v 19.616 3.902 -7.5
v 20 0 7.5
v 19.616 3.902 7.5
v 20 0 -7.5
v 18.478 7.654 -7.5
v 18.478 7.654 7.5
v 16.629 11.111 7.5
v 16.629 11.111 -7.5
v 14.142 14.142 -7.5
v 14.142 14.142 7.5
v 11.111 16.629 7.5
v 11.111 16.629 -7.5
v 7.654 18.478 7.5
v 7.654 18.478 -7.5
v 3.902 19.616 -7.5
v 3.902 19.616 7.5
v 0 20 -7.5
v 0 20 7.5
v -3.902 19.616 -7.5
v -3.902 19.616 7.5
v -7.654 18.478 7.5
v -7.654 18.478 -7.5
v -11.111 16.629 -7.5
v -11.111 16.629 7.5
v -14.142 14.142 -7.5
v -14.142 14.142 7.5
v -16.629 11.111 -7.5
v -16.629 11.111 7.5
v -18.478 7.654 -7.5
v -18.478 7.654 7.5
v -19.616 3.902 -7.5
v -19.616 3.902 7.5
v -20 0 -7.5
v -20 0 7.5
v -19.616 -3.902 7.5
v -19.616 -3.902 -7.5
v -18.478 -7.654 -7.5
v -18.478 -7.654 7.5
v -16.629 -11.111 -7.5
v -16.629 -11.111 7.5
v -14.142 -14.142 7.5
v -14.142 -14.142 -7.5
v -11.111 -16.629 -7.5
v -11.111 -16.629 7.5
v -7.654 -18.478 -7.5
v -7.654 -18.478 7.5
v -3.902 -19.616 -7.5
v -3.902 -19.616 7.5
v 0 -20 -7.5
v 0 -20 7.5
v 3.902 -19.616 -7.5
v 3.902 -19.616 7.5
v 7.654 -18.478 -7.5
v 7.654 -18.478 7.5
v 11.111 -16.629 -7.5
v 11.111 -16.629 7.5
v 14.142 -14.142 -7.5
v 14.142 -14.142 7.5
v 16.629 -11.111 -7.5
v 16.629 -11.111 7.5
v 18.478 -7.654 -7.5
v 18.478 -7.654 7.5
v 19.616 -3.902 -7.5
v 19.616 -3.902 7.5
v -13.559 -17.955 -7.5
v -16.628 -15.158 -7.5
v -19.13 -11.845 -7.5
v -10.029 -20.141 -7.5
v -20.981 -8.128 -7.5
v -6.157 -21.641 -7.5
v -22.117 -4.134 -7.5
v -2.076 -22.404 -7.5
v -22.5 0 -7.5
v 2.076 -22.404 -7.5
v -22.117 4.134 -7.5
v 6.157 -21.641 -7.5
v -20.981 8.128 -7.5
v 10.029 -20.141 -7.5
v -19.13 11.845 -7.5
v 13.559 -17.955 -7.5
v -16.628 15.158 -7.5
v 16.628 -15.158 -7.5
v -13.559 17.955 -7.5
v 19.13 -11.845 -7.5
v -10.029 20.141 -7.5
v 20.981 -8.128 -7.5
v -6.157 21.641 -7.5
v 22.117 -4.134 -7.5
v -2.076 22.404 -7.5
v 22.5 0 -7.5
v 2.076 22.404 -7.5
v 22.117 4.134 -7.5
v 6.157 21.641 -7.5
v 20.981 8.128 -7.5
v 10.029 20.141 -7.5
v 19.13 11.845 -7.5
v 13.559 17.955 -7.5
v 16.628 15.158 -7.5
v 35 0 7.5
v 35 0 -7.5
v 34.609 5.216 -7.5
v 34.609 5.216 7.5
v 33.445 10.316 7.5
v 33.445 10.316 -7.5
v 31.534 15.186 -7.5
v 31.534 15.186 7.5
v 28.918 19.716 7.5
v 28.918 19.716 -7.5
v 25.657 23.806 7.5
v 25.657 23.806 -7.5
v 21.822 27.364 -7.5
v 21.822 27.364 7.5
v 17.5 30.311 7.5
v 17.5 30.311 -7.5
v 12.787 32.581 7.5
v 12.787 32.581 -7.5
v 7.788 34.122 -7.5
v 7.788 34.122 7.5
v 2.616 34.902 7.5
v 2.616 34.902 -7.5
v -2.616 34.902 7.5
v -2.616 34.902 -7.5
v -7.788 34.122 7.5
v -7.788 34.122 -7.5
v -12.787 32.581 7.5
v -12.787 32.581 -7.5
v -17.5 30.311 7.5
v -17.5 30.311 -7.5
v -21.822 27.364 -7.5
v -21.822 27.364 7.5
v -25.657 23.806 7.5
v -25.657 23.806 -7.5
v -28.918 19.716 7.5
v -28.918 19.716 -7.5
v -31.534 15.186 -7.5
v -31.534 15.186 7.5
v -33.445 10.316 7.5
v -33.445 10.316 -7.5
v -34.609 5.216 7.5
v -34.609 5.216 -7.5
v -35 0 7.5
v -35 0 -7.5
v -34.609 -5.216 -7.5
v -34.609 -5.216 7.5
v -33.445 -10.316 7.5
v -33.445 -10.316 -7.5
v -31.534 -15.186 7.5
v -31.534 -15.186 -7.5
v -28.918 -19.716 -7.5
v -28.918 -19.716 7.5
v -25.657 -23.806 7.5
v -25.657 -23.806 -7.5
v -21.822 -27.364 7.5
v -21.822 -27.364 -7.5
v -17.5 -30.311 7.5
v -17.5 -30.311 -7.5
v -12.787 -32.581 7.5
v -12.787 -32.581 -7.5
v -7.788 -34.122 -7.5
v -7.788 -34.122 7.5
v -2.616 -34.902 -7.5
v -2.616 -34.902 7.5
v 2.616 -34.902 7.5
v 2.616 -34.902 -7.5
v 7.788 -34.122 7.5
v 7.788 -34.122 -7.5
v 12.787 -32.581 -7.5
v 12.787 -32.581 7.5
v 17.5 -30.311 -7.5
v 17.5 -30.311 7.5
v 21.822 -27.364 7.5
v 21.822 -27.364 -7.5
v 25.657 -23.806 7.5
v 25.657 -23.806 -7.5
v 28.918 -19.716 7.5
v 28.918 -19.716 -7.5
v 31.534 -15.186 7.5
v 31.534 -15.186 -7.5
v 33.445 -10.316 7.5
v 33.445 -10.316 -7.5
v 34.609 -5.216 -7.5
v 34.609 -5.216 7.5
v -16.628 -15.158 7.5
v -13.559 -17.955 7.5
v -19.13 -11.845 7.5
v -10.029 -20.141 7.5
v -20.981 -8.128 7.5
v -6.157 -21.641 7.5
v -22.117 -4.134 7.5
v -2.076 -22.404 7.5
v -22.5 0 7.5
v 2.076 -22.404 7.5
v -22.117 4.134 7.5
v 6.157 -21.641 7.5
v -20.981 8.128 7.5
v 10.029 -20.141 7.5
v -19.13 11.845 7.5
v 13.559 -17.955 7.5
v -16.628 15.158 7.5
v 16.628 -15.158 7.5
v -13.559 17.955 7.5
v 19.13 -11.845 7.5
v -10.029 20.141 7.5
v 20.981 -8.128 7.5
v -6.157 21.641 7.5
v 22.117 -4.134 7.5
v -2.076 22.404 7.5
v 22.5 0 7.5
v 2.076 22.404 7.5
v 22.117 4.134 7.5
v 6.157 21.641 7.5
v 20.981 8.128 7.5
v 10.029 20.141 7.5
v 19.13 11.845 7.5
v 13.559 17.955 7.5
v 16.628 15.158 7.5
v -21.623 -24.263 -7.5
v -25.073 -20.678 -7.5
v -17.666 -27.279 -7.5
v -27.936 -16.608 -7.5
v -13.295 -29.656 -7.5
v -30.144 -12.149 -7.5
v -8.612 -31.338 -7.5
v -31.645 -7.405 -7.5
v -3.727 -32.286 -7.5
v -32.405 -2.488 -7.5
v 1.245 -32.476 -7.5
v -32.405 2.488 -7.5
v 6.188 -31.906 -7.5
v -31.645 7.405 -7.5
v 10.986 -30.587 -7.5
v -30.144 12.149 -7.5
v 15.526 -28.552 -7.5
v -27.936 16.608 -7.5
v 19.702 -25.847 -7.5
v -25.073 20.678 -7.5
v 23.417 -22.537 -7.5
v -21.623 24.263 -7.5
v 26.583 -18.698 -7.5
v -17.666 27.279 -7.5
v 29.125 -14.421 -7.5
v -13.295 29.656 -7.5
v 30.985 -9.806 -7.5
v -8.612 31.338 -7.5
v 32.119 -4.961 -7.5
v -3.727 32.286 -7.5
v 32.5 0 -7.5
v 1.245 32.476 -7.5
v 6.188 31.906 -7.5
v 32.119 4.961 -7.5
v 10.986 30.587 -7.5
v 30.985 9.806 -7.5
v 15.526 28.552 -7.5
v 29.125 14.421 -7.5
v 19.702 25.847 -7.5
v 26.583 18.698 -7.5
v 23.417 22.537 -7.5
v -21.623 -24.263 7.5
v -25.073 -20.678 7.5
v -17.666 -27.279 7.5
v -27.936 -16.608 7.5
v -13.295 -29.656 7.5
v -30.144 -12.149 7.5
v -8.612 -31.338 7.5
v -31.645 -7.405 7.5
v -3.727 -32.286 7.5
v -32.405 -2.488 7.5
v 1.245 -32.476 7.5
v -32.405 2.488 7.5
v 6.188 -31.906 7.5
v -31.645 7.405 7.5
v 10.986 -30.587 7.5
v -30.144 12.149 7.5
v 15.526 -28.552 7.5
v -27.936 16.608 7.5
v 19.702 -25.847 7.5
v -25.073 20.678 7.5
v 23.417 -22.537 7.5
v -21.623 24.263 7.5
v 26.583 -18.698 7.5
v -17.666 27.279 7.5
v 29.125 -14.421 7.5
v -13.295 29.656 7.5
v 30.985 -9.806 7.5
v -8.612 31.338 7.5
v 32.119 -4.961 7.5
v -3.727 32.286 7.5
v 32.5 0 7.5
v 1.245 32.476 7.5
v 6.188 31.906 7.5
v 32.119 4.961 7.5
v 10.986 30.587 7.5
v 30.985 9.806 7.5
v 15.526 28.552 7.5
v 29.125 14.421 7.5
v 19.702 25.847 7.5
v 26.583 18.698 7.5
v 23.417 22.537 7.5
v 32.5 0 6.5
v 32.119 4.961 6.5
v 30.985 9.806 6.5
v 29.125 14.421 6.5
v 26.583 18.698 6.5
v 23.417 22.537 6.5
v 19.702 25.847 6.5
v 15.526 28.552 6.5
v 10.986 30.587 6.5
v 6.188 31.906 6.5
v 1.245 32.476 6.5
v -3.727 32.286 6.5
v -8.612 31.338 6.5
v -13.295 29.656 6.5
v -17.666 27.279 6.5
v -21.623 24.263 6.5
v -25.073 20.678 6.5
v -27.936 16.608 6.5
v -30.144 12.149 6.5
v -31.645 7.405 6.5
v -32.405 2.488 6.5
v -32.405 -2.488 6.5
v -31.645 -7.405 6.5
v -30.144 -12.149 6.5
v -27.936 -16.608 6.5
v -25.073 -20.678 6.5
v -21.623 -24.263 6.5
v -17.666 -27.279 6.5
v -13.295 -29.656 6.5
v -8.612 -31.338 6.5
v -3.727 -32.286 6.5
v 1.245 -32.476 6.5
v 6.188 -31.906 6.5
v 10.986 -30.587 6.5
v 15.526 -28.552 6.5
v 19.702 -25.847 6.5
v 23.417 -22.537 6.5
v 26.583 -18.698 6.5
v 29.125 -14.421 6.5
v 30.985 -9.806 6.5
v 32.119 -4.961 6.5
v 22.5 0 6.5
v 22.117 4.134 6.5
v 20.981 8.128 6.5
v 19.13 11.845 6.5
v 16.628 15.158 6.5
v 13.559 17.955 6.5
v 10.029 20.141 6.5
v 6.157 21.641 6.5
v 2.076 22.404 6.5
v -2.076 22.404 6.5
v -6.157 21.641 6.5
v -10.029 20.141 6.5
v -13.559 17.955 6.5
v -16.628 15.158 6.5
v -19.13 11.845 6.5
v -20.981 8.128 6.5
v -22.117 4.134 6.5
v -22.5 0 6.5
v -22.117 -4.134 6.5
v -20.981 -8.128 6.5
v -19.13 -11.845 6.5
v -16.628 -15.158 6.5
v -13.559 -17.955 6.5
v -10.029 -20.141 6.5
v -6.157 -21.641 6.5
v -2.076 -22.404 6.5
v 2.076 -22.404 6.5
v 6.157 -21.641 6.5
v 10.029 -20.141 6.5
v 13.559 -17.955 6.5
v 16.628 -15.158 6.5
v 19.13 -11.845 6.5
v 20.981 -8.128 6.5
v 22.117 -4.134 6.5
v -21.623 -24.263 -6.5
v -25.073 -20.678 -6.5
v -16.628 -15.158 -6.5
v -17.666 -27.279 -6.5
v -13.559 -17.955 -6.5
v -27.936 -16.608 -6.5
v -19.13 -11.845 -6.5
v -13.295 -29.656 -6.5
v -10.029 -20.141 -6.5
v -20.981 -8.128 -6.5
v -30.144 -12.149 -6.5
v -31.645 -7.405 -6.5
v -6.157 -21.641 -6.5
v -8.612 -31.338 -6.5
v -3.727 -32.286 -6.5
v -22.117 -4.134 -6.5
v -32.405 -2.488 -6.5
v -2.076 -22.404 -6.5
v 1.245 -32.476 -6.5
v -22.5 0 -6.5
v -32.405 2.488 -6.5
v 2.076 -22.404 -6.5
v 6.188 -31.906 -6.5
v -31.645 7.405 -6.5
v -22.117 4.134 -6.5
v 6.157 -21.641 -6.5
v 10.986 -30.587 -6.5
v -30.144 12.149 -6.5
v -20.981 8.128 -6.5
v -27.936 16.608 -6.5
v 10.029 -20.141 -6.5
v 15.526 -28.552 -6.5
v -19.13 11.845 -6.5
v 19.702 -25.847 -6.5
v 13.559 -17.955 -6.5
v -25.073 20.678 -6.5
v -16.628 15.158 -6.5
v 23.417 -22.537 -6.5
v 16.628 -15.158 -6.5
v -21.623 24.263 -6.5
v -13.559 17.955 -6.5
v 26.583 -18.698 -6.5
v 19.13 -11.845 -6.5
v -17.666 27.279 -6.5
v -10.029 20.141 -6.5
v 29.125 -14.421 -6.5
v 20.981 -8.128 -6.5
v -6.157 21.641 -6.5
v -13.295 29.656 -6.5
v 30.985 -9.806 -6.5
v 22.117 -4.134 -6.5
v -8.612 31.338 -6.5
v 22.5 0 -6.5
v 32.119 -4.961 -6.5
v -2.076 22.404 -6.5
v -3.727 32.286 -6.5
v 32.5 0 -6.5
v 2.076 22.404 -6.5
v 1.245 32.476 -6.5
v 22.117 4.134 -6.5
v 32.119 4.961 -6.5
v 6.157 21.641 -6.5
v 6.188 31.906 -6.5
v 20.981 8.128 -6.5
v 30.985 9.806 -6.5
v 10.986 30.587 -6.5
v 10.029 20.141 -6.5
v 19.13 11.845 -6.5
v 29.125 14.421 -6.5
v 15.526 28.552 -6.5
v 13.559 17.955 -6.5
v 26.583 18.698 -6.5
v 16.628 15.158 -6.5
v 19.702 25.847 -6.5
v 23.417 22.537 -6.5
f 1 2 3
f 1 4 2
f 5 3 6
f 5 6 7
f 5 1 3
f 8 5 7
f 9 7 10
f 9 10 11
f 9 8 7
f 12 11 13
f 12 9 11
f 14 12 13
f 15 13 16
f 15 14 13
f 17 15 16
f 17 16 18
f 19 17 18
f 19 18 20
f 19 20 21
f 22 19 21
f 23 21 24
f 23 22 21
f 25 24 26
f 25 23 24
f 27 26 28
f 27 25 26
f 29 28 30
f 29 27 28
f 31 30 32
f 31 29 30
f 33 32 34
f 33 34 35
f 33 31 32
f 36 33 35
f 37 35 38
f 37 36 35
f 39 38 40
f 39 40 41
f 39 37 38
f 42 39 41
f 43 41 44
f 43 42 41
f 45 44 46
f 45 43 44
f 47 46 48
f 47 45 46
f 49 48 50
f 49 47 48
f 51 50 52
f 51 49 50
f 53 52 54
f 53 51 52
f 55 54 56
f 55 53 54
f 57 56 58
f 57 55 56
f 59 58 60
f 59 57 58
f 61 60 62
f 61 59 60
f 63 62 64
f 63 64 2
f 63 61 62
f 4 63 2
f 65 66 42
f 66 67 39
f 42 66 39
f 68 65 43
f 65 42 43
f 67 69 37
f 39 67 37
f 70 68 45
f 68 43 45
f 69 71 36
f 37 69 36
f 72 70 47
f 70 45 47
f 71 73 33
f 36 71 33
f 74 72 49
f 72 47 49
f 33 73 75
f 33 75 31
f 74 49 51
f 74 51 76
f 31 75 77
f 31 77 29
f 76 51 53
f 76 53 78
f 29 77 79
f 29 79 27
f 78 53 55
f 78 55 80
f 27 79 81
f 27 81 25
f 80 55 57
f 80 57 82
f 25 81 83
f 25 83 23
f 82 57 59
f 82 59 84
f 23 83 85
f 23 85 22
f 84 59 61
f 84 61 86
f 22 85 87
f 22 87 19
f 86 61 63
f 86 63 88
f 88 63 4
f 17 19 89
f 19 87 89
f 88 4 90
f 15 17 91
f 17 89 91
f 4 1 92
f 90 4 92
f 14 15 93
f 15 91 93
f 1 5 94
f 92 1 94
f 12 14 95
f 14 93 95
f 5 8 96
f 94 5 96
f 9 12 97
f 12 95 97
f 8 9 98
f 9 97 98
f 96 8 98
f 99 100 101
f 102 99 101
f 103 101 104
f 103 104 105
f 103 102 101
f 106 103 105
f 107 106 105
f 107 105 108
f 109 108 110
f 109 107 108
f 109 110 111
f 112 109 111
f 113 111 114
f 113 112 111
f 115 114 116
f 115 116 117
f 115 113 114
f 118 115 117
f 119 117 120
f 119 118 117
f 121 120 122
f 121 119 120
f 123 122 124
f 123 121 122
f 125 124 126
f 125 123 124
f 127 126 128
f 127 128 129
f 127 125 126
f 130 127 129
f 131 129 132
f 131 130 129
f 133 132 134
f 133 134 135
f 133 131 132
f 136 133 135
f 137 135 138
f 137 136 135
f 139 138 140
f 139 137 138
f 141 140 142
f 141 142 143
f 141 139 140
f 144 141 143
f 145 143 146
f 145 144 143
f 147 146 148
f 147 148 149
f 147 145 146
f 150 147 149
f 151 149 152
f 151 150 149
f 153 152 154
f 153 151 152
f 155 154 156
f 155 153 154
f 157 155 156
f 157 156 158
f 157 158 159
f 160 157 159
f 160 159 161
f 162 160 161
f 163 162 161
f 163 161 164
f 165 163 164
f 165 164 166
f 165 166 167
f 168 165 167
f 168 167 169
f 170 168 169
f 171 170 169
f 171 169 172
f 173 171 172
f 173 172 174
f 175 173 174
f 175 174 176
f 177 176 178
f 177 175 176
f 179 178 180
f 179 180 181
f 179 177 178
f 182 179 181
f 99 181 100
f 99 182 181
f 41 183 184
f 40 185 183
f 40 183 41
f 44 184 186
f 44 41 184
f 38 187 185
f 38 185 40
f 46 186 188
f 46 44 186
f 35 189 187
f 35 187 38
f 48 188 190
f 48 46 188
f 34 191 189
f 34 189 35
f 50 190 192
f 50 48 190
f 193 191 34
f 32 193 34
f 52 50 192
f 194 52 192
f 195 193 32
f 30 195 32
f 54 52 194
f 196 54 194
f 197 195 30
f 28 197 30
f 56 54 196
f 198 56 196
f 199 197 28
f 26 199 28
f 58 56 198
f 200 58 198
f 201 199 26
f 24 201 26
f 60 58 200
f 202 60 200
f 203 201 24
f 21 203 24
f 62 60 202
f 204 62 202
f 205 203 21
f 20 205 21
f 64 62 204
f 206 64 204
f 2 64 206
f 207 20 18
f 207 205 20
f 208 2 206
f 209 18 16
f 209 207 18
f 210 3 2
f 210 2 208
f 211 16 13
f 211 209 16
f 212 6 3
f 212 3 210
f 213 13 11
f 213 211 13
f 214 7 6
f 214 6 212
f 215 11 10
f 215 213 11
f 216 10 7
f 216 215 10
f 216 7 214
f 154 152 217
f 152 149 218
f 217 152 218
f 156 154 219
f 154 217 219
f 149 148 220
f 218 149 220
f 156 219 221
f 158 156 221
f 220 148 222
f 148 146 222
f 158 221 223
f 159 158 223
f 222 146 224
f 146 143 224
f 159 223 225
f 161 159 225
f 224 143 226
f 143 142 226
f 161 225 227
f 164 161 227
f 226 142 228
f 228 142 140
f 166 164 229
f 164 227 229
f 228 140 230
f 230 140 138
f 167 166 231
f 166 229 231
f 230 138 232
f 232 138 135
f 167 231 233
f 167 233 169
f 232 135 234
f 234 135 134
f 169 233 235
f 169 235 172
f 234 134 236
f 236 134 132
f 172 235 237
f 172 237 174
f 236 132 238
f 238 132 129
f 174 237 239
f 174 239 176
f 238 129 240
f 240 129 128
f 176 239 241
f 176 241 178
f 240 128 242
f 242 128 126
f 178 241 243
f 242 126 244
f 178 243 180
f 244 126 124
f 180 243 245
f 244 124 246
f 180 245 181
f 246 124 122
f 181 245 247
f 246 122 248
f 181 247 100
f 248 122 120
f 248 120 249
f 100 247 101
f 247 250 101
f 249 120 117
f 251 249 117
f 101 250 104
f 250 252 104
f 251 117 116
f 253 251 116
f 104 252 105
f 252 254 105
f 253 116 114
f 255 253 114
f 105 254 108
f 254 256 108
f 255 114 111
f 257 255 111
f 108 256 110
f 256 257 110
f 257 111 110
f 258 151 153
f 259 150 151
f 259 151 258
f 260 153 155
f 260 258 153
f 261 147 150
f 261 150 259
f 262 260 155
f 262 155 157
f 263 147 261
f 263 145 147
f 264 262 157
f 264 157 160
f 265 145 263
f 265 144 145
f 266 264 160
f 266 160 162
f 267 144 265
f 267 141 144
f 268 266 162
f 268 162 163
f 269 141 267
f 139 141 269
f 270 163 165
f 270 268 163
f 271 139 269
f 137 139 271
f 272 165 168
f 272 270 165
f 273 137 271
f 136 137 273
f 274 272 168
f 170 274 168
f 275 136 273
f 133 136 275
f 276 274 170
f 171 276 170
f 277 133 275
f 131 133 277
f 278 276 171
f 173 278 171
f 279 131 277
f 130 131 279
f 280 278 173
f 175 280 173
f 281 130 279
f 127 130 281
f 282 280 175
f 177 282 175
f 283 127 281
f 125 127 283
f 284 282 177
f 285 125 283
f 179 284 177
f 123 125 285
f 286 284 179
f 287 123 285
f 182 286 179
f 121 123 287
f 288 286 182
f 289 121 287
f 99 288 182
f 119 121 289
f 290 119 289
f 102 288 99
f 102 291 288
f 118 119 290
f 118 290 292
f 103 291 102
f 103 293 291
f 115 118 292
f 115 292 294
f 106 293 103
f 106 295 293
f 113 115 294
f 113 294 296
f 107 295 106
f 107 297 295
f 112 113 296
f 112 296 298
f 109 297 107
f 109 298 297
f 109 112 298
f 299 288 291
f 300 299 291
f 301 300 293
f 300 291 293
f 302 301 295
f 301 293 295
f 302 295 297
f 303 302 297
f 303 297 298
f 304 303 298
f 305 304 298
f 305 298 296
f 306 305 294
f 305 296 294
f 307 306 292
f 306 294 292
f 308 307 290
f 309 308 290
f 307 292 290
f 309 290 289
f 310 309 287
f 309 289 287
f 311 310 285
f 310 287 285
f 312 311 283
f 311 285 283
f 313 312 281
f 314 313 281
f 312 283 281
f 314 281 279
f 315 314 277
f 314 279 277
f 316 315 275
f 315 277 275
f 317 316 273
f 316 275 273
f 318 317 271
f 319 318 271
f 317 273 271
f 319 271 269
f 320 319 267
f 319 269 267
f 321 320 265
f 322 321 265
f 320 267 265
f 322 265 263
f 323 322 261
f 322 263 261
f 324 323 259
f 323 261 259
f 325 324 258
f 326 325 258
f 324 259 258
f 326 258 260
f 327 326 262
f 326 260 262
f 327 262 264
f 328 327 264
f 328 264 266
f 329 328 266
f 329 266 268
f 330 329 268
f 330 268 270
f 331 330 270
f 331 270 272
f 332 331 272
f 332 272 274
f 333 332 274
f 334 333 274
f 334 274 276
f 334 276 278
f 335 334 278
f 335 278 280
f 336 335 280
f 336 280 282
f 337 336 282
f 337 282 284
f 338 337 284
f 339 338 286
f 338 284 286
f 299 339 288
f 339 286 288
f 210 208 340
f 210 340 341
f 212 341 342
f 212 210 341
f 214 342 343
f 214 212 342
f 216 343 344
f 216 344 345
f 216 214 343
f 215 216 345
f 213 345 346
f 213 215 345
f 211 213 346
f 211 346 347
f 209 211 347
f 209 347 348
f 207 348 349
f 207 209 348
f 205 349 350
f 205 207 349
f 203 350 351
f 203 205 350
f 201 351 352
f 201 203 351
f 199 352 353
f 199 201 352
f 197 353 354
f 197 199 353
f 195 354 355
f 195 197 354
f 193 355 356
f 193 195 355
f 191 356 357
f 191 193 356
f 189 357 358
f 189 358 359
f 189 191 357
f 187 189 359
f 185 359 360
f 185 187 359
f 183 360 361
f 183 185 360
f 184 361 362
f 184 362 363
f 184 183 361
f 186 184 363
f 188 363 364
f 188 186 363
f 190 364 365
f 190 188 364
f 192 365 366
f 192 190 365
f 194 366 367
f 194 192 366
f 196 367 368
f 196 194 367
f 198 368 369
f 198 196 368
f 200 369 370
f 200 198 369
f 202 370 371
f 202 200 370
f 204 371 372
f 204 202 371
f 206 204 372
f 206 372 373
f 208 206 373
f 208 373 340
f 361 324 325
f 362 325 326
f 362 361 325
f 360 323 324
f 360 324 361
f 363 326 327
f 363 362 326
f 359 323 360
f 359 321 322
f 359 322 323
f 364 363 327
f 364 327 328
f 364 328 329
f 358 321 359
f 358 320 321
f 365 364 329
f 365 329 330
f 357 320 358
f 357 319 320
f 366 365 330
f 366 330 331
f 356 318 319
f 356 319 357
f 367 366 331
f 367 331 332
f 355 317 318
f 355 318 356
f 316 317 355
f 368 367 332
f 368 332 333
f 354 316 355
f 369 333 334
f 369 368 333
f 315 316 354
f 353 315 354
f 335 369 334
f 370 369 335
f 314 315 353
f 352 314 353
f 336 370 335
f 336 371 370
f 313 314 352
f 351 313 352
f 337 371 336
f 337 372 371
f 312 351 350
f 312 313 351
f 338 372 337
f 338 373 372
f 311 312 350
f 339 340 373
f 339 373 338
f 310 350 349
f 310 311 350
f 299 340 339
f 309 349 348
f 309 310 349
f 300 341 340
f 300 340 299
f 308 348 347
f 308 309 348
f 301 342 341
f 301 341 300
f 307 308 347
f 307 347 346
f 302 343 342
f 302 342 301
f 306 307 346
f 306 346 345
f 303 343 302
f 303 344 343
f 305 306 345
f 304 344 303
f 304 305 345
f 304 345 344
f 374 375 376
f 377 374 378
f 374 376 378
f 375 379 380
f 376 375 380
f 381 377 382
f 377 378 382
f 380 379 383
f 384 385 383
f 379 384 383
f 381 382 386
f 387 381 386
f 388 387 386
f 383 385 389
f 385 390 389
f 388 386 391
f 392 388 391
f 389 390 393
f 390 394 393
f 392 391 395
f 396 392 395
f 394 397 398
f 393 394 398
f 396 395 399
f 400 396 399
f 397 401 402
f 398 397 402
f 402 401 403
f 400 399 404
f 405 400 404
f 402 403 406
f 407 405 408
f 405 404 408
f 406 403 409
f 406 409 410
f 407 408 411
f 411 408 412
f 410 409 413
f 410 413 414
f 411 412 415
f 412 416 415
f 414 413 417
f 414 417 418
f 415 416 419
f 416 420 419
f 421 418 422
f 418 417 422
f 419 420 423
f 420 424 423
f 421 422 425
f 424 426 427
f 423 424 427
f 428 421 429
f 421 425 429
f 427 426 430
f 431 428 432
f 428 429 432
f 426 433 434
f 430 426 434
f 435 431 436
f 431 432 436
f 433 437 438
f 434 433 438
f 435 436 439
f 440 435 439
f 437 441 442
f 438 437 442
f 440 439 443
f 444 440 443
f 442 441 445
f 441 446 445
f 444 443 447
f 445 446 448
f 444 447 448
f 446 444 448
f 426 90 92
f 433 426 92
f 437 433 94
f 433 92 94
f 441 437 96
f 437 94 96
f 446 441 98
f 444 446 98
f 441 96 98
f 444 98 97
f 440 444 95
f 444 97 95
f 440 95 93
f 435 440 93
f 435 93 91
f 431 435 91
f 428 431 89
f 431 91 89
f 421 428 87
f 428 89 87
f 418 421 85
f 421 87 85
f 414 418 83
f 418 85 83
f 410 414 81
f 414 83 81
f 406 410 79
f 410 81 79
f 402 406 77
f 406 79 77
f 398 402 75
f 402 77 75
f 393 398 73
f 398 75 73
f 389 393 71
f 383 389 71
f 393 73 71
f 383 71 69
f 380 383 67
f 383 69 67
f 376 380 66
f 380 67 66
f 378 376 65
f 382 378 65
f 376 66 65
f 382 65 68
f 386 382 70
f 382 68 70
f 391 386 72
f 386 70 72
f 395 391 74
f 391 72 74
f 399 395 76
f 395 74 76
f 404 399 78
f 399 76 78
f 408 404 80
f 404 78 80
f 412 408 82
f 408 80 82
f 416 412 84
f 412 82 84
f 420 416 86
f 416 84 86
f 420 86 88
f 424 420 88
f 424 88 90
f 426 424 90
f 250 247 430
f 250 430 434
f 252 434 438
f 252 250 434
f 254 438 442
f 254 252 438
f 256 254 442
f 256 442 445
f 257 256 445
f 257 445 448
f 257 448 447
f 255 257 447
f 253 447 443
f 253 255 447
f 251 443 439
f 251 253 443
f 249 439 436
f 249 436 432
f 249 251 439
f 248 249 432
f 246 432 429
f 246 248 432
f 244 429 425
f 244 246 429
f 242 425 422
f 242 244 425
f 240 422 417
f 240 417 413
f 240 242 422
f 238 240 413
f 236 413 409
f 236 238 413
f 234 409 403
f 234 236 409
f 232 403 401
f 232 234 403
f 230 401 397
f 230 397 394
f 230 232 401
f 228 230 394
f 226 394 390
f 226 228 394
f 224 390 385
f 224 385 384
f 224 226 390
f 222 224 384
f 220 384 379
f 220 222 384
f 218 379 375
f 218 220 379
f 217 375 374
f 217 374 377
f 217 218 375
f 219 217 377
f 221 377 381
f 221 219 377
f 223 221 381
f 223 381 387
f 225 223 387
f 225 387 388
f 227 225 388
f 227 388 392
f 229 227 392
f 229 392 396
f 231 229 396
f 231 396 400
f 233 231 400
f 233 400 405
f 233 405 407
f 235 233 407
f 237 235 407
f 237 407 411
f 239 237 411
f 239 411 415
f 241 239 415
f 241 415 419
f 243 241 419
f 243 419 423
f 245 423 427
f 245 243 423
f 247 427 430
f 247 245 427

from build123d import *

# Parameters (mm, degrees)
SKETCH1_R           = 35
SKETCH1_R_2         = 20
BOSS_EXTRUDE1_DEPTH = 7.5
SKETCH2_R           = 32.5
SKETCH2_R_2         = 22.5
CUT_EXTRUDE1_DEPTH  = 1


with BuildPart() as part:
    # Sketch1 → Boss-Extrude1 (new body, symmetric)
    with BuildSketch(Plane.XY):
        Circle(SKETCH1_R)
        Circle(SKETCH1_R_2, mode=Mode.SUBTRACT)
    extrude(amount=BOSS_EXTRUDE1_DEPTH, both=True)

    # Sketch2 → Cut-Extrude1 (cut)
    with BuildSketch(Plane.XY.offset(7.5)):
        Circle(SKETCH2_R)
        Circle(SKETCH2_R_2, mode=Mode.SUBTRACT)
    cut_extrude1 = extrude(amount=-CUT_EXTRUDE1_DEPTH, mode=Mode.SUBTRACT)

    # Mirror1: Cut-Extrude1 across plane
    add(cut_extrude1.mirror(Plane.XY), mode=Mode.SUBTRACT)


solid = part.part
